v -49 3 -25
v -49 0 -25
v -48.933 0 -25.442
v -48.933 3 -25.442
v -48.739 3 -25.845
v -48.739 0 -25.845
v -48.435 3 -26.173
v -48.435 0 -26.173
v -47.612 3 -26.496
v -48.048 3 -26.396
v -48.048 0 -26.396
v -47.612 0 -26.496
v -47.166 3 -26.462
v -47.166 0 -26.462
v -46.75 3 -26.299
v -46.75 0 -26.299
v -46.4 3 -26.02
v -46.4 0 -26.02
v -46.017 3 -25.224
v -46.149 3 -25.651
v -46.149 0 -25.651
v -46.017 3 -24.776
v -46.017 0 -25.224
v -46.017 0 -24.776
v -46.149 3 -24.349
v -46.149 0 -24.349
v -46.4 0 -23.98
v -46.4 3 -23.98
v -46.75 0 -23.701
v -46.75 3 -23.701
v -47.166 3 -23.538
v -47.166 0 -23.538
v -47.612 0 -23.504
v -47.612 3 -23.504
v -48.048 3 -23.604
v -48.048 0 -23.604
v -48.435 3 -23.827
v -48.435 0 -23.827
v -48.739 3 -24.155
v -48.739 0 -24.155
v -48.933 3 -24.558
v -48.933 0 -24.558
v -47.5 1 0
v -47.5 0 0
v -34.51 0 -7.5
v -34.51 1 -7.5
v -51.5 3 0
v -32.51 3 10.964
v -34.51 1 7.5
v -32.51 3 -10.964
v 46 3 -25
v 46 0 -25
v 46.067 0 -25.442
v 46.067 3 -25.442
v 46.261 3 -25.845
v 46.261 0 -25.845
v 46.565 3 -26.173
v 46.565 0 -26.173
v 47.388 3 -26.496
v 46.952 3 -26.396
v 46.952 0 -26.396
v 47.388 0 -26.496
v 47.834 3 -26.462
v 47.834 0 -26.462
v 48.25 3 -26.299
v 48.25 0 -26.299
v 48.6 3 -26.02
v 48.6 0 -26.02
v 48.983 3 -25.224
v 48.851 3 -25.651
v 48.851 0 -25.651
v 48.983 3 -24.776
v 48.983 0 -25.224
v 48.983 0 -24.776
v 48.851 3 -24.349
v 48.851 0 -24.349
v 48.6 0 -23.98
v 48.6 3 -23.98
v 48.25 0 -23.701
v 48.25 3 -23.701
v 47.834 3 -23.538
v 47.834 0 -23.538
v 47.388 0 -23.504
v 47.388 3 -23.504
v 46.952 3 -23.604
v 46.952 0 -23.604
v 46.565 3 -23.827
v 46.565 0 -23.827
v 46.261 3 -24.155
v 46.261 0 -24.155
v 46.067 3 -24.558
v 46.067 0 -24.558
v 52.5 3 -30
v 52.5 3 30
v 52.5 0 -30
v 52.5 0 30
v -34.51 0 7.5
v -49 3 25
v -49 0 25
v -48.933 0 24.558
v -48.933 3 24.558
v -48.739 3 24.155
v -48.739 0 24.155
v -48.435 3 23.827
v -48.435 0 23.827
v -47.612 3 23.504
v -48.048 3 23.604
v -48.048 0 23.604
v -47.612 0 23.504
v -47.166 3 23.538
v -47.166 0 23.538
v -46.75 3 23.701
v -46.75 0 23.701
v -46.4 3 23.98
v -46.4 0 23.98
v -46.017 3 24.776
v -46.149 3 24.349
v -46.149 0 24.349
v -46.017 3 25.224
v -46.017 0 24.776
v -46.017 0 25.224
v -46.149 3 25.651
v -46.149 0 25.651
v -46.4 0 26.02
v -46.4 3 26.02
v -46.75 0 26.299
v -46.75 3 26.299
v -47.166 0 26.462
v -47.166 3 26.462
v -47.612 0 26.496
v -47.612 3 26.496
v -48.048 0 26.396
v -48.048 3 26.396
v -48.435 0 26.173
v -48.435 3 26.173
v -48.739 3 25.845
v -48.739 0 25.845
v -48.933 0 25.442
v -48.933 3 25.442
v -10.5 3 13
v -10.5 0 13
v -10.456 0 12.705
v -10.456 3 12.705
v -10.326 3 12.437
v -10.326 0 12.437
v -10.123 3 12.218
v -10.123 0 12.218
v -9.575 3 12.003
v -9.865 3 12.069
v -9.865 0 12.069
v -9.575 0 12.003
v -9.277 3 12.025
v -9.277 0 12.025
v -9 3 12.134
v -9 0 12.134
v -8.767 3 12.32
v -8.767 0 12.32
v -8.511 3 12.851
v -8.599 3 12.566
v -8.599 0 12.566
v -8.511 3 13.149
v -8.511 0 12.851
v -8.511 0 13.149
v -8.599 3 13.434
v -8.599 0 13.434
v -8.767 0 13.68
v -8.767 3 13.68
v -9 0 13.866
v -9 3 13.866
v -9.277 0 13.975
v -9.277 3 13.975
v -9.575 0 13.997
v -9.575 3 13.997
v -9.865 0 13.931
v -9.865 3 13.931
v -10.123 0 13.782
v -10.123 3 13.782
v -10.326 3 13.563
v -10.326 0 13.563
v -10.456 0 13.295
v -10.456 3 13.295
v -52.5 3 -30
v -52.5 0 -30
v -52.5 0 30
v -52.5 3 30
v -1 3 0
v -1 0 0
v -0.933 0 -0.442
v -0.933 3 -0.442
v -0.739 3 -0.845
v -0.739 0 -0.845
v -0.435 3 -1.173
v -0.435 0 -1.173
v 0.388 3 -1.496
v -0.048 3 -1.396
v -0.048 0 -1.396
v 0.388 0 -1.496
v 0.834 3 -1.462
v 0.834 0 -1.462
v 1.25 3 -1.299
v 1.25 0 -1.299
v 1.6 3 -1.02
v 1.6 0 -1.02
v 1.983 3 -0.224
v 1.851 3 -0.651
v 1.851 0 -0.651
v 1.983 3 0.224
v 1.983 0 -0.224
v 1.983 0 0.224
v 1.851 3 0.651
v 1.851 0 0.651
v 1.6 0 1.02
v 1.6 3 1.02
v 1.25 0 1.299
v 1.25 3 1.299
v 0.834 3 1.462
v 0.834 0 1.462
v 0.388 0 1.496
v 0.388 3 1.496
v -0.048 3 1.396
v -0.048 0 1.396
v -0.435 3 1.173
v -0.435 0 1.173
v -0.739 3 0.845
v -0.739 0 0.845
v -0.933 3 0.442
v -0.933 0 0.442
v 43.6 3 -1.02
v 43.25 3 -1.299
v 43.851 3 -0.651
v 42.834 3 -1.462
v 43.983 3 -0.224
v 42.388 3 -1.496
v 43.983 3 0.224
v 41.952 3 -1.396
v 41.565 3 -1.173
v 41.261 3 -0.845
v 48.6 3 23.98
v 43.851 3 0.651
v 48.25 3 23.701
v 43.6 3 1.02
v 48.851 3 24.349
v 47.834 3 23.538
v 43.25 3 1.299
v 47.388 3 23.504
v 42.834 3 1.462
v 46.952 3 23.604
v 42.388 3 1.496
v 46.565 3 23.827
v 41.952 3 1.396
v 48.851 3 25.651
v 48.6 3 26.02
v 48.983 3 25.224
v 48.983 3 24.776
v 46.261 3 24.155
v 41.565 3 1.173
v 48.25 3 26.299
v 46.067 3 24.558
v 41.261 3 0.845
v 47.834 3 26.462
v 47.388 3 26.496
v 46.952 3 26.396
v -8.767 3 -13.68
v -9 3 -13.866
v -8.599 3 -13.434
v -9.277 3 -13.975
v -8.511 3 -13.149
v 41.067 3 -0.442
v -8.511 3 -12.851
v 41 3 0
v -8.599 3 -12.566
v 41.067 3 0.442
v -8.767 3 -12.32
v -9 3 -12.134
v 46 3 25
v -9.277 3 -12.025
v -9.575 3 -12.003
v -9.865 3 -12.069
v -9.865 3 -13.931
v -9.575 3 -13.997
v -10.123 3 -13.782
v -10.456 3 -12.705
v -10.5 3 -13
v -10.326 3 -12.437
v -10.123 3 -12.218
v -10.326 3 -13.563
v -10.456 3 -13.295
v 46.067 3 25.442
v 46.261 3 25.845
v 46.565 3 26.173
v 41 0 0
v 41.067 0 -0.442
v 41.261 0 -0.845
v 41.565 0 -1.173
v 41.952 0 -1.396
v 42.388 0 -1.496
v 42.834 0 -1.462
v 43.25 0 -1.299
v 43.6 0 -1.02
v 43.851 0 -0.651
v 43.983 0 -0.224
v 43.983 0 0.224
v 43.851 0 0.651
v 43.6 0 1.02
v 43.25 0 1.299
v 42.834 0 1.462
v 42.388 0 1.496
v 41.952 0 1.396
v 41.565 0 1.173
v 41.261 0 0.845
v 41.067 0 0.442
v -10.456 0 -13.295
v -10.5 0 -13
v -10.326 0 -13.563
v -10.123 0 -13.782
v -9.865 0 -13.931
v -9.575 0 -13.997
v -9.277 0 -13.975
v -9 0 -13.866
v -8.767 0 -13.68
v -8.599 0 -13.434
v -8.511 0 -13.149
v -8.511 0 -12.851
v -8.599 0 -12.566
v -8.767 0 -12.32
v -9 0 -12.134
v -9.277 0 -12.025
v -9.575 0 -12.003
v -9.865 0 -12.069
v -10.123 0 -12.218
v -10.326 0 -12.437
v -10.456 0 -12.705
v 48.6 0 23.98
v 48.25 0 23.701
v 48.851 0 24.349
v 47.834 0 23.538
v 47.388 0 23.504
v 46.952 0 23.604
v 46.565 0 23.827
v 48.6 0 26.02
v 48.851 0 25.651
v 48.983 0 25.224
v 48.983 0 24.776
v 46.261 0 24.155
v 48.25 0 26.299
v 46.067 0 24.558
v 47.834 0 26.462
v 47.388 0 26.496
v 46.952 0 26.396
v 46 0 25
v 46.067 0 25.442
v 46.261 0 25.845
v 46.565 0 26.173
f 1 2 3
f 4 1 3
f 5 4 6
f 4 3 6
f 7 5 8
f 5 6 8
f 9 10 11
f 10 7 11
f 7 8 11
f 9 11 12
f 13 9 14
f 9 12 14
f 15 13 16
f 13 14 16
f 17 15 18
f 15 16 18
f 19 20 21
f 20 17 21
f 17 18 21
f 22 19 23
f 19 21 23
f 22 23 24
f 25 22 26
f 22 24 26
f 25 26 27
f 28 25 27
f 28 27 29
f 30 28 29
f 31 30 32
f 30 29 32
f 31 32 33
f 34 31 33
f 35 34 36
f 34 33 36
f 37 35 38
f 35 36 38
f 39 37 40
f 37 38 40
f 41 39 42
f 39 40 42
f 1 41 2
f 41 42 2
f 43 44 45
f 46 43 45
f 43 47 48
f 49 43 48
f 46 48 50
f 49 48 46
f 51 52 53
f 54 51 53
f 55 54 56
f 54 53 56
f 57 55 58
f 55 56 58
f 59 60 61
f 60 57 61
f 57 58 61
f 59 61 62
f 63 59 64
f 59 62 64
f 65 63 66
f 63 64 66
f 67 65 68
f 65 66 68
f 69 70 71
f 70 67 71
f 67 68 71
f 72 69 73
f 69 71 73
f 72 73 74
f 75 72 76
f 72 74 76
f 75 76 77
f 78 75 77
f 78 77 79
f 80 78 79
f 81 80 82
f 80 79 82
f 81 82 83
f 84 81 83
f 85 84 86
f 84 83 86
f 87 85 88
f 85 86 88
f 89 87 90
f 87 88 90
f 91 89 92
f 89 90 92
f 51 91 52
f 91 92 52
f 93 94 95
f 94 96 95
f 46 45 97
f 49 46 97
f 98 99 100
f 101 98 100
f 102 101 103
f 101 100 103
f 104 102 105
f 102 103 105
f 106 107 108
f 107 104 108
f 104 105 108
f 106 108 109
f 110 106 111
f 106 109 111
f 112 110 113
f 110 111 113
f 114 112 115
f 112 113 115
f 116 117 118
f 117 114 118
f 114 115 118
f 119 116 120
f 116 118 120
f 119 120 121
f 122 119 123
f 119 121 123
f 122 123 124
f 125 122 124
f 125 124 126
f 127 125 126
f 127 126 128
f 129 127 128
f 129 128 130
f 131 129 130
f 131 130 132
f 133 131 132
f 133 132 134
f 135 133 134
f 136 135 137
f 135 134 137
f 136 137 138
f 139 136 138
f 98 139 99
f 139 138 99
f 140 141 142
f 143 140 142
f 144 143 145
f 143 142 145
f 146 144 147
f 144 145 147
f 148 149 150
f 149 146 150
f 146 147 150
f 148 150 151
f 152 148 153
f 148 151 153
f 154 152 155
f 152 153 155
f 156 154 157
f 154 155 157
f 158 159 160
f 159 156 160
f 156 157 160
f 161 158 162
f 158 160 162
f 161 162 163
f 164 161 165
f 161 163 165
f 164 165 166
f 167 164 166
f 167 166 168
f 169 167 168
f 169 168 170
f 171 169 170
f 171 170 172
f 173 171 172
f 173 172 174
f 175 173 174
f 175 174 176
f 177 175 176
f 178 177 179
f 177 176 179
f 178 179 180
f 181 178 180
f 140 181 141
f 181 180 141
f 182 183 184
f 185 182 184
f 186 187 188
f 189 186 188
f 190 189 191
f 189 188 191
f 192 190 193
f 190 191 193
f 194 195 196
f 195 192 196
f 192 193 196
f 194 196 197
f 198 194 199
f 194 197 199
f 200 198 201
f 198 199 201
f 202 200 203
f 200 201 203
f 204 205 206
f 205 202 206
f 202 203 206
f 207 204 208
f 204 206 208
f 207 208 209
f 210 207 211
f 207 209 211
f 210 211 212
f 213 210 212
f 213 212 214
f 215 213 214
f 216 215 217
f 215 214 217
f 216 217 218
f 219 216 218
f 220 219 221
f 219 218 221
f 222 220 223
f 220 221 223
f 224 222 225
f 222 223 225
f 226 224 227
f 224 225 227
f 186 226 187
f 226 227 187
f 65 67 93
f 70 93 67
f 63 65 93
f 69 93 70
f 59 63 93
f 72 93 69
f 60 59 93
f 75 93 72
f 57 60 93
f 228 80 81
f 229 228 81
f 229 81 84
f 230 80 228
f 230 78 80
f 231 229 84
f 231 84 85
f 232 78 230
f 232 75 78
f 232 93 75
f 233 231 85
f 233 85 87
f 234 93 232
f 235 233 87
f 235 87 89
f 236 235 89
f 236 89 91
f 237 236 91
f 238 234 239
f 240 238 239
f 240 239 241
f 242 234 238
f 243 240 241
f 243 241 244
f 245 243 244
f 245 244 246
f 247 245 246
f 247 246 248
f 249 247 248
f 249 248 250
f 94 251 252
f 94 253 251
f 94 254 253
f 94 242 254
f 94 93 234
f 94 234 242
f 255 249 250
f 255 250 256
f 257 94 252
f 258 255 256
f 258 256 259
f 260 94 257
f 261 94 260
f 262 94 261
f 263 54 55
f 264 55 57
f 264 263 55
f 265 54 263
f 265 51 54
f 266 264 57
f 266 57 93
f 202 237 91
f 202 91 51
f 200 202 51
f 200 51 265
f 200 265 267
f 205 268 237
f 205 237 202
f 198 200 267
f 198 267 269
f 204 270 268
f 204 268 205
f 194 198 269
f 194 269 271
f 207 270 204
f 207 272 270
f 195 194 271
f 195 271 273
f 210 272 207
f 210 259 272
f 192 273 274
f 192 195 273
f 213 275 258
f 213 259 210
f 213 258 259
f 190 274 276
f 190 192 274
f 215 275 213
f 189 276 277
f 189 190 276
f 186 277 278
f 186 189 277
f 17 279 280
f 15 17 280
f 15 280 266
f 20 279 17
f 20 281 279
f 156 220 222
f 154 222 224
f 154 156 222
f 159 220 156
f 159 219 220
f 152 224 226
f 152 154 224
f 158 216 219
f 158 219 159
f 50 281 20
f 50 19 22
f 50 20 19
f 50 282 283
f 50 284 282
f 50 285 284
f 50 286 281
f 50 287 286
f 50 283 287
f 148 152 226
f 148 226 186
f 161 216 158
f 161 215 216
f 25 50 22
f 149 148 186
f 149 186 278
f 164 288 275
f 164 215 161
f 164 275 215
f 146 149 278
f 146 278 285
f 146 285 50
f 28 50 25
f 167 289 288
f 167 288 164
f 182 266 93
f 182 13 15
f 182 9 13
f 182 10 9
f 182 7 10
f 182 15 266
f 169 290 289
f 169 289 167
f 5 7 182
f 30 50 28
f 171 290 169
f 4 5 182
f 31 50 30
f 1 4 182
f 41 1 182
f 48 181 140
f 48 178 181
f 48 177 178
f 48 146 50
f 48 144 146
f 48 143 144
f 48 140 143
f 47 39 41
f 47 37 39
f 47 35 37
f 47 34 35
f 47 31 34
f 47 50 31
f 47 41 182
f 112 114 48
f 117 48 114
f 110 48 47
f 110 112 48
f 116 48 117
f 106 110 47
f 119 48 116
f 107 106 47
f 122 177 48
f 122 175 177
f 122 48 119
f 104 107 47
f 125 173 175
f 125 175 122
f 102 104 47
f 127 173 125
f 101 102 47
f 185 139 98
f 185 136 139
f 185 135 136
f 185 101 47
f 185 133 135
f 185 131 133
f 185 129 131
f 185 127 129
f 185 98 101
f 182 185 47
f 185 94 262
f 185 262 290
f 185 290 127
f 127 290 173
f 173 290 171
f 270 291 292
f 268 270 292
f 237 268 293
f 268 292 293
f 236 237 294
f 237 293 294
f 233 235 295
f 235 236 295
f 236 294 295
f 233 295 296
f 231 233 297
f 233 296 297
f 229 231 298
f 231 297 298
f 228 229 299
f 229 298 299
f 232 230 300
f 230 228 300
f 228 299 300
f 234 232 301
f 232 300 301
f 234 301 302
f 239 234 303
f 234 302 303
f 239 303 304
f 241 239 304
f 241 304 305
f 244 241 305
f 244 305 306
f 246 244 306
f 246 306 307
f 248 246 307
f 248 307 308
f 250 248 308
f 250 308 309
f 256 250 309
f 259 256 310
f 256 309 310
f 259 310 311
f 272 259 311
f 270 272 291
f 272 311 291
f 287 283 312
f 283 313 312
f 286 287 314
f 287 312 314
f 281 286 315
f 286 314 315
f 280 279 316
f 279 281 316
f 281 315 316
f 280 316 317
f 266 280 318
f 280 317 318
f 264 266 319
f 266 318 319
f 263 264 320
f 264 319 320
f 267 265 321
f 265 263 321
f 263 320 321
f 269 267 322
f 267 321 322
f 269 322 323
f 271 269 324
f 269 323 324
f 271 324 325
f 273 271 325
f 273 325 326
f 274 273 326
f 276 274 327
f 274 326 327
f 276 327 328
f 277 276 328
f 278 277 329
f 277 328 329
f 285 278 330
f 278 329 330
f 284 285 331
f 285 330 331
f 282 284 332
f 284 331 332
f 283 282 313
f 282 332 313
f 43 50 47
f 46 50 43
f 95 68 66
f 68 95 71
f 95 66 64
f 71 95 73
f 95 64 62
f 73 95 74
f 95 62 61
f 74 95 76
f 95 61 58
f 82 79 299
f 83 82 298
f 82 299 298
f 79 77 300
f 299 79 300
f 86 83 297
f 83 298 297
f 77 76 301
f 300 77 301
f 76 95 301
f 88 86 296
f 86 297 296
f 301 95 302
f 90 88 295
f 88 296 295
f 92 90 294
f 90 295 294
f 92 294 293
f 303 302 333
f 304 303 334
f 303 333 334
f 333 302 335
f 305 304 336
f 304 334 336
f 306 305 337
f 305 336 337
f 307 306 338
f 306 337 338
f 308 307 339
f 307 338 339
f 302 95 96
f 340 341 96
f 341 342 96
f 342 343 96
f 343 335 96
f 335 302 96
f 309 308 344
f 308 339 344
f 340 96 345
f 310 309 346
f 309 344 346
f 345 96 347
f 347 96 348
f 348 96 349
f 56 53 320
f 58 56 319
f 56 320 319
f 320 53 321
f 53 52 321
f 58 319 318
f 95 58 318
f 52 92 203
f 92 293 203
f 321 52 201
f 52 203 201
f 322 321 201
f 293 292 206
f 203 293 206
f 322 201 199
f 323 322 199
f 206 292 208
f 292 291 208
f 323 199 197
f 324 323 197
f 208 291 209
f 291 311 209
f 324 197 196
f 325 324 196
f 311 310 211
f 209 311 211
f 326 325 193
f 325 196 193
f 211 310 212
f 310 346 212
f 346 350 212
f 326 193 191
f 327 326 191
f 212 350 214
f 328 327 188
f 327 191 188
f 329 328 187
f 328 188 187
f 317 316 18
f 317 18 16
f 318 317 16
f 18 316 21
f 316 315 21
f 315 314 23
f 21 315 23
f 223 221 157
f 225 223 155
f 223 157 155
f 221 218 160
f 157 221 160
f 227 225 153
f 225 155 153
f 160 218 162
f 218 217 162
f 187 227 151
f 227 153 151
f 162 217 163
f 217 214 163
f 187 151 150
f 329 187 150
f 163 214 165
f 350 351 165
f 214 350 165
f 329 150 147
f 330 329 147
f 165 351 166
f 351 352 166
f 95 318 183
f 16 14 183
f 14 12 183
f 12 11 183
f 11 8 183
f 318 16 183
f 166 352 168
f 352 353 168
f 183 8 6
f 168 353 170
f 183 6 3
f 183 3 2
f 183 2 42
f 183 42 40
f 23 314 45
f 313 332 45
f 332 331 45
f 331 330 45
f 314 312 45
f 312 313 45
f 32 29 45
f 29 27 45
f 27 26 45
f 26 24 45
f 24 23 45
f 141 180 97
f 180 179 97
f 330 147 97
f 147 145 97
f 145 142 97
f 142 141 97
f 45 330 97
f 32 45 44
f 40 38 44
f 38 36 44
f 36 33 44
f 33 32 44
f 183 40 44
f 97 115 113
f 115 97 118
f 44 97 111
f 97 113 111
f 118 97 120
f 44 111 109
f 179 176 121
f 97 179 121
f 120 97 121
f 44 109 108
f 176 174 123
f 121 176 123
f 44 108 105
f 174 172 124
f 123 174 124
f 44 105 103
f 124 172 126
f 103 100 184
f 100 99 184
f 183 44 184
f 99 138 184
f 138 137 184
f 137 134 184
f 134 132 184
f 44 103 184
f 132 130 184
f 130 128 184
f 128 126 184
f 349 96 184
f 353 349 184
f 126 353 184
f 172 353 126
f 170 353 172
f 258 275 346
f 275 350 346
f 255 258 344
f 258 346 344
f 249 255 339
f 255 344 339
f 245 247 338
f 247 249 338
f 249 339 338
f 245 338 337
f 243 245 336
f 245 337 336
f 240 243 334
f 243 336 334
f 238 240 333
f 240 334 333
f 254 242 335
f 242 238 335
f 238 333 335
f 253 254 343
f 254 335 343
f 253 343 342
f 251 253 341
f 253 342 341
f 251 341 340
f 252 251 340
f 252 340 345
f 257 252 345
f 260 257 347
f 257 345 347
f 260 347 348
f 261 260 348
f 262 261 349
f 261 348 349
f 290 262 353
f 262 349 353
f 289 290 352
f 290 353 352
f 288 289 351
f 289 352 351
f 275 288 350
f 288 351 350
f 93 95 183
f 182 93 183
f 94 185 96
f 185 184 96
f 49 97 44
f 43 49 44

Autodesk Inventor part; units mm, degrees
ref_plane "YZ Plane" through (0, 0, 0) normal (1, 0, 0) x (0, 1, 0)
ref_plane "XZ Plane" through (0, 0, 0) normal (0, 1, 0) x (-1, 0, 0)
ref_plane "XY Plane" through (0, 0, 0) normal (0, 0, 1) x (1, 0, 0)
sketch "Sketch1" plane through (0, 0, 0) normal (0, 1, 0) x (-1, 0, 0)
  line L0 (52.5, 30) -> (-52.5, 30)
  line L1 (-52.5, 30) -> (-52.5, -30)
  line L2 (-52.5, -30) -> (52.5, -30)
  line L3 (52.5, -30) -> (52.5, 30)
  line L4 (52.5, 0) -> (-52.5, 0) construction
  circle A0 centre (-42.5, 0) radius 1.5
  circle A1 centre (-0.5, 0) radius 1.5
  line L5 (-47.5, 25) -> (47.5, 25) construction
  line L6 (47.5, 25) -> (47.5, -25) construction
  line L7 (47.5, -25) -> (-47.5, -25) construction
  line L8 (-47.5, -25) -> (-47.5, 25) construction
  circle A2 centre (47.5, 25) radius 1.5
  circle A3 centre (47.5, -25) radius 1.5
  circle A4 centre (-47.5, 25) radius 1.5
  circle A5 centre (-47.5, -25) radius 1.5
  line L9 (47.5, 0) -> (34.5096, -7.5)
  line L10 (34.5096, -7.5) -> (34.5096, 7.5)
  line L11 (34.5096, 7.5) -> (47.5, 0)
  circle A6 centre (9.5, -13) radius 1
  circle A7 centre (9.5, 13) radius 1
  line L12 (9.5, -30) -> (9.5, 30) construction
  point P0 (0, 0)
  point P1 (0, 0)
  point P2 (38.8397, 0)
  dimension "d0" = 105
  dimension "d1" = 60
  dimension "d2" = 3
  dimension "d3" = 3
  dimension "d4" = 42
  dimension "d5" = 5
  dimension "d6" = 3
  dimension "d7" = 3
  dimension "d8" = 3
  dimension "d9" = 3
  dimension "d10" = 15
  dimension "d11" = 10
  dimension "d17" = 2
  dimension "d18" = 2
  dimension "d19" = 26
  dimension "d20" = 10
extrude "Extrusion1" add sketch "Sketch1" along normal blind 3
chamfer "Chamfer1" distance 2 angle 45 3 edges at (-41.0048, 3, -3.75) (-41.0048, 3, 3.75) (-34.5096, 3, 0)
properties part number "Front back" material "Iron, Gray"
